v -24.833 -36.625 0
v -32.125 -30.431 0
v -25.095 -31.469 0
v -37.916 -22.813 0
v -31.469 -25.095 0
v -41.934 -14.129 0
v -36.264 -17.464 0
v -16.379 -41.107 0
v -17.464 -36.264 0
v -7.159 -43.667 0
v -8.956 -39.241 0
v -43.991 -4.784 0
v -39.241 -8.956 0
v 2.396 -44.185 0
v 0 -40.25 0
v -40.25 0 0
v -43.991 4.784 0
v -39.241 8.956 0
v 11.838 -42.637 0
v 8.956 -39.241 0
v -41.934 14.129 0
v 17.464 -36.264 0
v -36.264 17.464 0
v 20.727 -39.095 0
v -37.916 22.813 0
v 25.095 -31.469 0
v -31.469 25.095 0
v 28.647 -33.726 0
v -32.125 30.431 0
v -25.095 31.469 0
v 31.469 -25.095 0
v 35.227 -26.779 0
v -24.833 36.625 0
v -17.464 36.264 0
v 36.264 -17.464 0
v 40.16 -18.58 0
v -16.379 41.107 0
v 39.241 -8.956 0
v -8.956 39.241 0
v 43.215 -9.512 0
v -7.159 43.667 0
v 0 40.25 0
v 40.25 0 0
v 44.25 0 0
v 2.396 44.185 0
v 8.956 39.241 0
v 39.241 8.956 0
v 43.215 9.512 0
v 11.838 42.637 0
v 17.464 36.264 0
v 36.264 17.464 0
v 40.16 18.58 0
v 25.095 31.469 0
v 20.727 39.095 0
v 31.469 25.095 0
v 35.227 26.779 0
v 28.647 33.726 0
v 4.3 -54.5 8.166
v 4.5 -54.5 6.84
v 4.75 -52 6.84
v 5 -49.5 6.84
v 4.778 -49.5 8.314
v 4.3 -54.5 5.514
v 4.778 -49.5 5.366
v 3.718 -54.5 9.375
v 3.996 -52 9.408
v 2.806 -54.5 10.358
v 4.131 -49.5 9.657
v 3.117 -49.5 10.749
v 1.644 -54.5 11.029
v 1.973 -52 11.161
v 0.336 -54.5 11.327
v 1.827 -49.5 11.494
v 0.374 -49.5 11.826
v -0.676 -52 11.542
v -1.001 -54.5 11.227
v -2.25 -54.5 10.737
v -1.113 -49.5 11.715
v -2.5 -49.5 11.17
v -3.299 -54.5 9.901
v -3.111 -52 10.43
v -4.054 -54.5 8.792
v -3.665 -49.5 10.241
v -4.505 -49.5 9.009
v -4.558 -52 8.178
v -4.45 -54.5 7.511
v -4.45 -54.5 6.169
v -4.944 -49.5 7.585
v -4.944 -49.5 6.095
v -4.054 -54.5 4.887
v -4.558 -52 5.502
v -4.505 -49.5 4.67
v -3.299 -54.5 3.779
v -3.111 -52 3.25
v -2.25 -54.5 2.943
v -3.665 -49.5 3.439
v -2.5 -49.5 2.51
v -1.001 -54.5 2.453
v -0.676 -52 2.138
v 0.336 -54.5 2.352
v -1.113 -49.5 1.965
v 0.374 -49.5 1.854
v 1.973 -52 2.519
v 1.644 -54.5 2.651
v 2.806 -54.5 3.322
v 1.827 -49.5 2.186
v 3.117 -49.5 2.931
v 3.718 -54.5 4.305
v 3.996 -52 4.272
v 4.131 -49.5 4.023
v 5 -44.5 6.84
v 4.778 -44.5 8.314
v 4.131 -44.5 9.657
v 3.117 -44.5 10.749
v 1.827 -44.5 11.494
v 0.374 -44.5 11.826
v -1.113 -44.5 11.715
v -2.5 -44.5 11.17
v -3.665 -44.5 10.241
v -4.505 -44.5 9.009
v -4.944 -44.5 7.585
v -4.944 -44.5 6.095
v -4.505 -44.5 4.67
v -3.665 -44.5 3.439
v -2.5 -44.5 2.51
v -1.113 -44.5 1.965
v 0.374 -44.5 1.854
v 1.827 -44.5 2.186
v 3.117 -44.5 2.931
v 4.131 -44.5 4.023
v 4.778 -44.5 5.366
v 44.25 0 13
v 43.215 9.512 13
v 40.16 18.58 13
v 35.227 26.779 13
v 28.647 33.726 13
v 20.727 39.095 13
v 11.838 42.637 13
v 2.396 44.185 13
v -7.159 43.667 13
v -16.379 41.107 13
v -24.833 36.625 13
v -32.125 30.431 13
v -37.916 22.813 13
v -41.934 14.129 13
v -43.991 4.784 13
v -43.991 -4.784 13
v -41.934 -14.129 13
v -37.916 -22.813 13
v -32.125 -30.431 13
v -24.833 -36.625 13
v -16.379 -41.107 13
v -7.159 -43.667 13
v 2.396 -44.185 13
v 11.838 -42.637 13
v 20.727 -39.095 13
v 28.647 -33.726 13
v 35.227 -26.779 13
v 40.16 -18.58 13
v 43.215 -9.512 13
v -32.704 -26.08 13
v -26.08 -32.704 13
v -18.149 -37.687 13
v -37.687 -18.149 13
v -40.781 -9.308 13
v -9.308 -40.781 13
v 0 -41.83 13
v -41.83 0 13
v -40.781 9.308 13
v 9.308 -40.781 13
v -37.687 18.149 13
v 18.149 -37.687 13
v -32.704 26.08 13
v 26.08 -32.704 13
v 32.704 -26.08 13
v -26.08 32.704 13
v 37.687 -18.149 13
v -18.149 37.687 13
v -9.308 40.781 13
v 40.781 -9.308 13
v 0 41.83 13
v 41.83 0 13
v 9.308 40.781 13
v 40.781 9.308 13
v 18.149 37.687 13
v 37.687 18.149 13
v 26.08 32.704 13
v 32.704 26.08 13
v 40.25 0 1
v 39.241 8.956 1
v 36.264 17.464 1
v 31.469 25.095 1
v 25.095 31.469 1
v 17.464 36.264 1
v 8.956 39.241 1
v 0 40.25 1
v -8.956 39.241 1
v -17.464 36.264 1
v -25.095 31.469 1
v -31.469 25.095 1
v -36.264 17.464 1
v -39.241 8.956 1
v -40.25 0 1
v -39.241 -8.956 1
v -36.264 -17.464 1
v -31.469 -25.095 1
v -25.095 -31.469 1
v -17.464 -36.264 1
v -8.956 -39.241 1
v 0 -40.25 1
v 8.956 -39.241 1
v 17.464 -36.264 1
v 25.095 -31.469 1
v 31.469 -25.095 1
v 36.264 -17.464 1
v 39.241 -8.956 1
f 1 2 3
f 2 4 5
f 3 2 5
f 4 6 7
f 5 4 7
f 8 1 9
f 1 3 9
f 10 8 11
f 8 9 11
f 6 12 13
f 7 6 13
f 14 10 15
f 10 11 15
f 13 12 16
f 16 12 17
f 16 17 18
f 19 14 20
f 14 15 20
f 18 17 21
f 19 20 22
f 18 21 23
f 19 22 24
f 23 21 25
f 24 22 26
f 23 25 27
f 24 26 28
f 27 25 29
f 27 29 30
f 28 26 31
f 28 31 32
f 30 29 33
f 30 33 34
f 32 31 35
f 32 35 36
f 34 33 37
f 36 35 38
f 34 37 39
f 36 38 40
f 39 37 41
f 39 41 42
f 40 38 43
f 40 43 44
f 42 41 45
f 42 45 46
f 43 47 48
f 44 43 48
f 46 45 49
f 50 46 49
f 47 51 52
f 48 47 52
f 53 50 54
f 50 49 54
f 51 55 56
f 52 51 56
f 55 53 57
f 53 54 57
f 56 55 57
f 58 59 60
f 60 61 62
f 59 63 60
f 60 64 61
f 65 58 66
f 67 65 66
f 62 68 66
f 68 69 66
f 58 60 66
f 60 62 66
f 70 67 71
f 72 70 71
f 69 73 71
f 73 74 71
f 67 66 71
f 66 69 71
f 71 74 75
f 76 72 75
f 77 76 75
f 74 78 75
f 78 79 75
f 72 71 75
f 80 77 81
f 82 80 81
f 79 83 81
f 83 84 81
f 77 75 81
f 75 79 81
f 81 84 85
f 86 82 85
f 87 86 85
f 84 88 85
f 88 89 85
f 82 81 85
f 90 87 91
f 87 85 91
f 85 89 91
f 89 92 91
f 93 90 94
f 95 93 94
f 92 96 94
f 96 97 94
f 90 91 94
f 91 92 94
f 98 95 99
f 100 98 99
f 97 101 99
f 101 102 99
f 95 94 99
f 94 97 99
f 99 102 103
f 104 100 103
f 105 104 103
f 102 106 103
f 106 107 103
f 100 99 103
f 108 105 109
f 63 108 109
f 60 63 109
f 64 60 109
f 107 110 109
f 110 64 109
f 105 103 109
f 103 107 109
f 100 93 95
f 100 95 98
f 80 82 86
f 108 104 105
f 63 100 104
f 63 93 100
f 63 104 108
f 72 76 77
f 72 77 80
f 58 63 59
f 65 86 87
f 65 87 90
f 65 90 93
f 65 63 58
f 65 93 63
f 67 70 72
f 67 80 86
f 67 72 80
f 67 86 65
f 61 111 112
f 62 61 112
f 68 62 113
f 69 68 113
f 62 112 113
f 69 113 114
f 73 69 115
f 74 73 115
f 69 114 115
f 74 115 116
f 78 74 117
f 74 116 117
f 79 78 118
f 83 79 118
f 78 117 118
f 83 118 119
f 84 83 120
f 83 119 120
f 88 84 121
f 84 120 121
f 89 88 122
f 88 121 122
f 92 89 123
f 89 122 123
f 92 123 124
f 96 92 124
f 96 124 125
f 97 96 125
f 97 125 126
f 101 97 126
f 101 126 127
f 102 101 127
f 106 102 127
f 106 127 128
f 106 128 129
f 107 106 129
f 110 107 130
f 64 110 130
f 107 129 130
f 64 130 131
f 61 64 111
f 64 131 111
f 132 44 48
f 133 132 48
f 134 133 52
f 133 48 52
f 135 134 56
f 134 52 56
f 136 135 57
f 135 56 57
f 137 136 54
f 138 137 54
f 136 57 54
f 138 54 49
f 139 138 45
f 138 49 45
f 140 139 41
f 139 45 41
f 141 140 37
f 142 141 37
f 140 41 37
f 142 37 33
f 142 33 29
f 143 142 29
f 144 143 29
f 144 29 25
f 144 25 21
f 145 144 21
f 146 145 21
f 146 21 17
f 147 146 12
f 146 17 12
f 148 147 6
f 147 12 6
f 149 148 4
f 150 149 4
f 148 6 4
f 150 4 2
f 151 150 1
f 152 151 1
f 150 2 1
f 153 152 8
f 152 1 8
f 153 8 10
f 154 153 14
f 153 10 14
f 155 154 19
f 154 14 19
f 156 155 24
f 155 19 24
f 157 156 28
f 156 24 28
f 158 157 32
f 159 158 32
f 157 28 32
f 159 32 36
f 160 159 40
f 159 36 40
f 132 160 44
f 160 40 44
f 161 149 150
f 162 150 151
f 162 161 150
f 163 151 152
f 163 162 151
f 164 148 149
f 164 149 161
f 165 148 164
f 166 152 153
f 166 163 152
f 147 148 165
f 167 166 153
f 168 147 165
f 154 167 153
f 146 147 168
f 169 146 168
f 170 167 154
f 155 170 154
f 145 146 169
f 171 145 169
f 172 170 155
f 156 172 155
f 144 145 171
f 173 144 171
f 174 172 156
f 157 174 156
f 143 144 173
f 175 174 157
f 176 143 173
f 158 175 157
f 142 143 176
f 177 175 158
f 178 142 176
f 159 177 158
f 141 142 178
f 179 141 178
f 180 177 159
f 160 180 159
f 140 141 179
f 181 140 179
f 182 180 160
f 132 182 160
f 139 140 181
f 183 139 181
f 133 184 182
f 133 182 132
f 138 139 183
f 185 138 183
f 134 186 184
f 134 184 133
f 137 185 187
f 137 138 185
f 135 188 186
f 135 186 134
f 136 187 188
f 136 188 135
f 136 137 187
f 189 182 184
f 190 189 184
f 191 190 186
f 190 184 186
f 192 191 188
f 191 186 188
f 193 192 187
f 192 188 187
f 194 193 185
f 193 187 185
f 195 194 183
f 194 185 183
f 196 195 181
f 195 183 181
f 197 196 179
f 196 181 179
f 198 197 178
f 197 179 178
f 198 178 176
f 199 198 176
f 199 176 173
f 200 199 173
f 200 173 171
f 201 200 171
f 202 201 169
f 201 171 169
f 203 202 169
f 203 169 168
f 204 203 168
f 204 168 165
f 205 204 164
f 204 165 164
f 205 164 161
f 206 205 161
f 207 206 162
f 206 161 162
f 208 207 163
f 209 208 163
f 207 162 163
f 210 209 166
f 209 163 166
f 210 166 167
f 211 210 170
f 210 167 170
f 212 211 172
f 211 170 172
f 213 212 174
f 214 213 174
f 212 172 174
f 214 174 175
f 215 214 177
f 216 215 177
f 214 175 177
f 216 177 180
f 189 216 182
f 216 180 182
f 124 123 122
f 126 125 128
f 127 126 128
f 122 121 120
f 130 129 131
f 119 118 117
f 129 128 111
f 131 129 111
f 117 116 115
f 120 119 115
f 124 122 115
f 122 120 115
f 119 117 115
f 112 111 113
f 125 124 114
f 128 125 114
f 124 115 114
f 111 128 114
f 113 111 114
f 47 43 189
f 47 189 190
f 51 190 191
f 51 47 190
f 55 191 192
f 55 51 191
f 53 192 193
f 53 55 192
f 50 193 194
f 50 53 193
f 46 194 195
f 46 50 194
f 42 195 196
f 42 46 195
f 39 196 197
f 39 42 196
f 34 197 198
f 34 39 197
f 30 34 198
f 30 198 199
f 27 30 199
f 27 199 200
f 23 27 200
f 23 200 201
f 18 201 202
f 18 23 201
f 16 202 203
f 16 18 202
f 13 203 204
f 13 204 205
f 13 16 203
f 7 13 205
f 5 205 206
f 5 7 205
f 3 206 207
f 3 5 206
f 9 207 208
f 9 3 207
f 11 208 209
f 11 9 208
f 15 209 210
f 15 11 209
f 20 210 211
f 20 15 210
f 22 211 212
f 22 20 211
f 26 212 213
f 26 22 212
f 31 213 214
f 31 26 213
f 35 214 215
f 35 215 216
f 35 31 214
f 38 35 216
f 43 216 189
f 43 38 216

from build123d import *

# Parameters (mm, degrees)
F0_R     = 44.25
F0_R_2   = 40.25
F1_DEPTH = 13
F3_R     = 5
F4_DEPTH = 10
F5_SIZE2 = 1.579829971
F5_SIZE  = 12
F6_SIZE2 = 5
F6_SIZE  = 0.5


with BuildPart() as f1:
    # F0 (on Top) → F1 (new body)
    with BuildSketch(Plane.XY):
        Circle(F0_R)
        Circle(F0_R_2, mode=Mode.SUBTRACT)
    extrude(amount=F1_DEPTH)

    # F5
    f5_edges = [f1.edges().sort_by_distance(p)[0] for p in [
        (-40.25, 0, 13),
    ]]
    f5_side = f1.faces().sort_by_distance((-40.25, 0, 6.5))[0]
    chamfer(f5_edges, length=F5_SIZE, length2=F5_SIZE2, reference=f5_side)


with BuildPart() as f4:
    # F3 (on offset) → F4 (new body)
    with BuildSketch(Plane.XZ.offset(44.5)):
        with Locations((0, 6.839911745)):
            Circle(F3_R)
    extrude(amount=F4_DEPTH)

    # F6
    f6_edges = [f4.edges().sort_by_distance(p)[0] for p in [
        (-5, -54.5, 6.839912),
    ]]
    f6_side = f4.faces().sort_by_distance((0, -54.5, 6.839912))[0]
    chamfer(f6_edges, length=F6_SIZE, length2=F6_SIZE2, reference=f6_side)


solid = Compound([f1.part, f4.part])
